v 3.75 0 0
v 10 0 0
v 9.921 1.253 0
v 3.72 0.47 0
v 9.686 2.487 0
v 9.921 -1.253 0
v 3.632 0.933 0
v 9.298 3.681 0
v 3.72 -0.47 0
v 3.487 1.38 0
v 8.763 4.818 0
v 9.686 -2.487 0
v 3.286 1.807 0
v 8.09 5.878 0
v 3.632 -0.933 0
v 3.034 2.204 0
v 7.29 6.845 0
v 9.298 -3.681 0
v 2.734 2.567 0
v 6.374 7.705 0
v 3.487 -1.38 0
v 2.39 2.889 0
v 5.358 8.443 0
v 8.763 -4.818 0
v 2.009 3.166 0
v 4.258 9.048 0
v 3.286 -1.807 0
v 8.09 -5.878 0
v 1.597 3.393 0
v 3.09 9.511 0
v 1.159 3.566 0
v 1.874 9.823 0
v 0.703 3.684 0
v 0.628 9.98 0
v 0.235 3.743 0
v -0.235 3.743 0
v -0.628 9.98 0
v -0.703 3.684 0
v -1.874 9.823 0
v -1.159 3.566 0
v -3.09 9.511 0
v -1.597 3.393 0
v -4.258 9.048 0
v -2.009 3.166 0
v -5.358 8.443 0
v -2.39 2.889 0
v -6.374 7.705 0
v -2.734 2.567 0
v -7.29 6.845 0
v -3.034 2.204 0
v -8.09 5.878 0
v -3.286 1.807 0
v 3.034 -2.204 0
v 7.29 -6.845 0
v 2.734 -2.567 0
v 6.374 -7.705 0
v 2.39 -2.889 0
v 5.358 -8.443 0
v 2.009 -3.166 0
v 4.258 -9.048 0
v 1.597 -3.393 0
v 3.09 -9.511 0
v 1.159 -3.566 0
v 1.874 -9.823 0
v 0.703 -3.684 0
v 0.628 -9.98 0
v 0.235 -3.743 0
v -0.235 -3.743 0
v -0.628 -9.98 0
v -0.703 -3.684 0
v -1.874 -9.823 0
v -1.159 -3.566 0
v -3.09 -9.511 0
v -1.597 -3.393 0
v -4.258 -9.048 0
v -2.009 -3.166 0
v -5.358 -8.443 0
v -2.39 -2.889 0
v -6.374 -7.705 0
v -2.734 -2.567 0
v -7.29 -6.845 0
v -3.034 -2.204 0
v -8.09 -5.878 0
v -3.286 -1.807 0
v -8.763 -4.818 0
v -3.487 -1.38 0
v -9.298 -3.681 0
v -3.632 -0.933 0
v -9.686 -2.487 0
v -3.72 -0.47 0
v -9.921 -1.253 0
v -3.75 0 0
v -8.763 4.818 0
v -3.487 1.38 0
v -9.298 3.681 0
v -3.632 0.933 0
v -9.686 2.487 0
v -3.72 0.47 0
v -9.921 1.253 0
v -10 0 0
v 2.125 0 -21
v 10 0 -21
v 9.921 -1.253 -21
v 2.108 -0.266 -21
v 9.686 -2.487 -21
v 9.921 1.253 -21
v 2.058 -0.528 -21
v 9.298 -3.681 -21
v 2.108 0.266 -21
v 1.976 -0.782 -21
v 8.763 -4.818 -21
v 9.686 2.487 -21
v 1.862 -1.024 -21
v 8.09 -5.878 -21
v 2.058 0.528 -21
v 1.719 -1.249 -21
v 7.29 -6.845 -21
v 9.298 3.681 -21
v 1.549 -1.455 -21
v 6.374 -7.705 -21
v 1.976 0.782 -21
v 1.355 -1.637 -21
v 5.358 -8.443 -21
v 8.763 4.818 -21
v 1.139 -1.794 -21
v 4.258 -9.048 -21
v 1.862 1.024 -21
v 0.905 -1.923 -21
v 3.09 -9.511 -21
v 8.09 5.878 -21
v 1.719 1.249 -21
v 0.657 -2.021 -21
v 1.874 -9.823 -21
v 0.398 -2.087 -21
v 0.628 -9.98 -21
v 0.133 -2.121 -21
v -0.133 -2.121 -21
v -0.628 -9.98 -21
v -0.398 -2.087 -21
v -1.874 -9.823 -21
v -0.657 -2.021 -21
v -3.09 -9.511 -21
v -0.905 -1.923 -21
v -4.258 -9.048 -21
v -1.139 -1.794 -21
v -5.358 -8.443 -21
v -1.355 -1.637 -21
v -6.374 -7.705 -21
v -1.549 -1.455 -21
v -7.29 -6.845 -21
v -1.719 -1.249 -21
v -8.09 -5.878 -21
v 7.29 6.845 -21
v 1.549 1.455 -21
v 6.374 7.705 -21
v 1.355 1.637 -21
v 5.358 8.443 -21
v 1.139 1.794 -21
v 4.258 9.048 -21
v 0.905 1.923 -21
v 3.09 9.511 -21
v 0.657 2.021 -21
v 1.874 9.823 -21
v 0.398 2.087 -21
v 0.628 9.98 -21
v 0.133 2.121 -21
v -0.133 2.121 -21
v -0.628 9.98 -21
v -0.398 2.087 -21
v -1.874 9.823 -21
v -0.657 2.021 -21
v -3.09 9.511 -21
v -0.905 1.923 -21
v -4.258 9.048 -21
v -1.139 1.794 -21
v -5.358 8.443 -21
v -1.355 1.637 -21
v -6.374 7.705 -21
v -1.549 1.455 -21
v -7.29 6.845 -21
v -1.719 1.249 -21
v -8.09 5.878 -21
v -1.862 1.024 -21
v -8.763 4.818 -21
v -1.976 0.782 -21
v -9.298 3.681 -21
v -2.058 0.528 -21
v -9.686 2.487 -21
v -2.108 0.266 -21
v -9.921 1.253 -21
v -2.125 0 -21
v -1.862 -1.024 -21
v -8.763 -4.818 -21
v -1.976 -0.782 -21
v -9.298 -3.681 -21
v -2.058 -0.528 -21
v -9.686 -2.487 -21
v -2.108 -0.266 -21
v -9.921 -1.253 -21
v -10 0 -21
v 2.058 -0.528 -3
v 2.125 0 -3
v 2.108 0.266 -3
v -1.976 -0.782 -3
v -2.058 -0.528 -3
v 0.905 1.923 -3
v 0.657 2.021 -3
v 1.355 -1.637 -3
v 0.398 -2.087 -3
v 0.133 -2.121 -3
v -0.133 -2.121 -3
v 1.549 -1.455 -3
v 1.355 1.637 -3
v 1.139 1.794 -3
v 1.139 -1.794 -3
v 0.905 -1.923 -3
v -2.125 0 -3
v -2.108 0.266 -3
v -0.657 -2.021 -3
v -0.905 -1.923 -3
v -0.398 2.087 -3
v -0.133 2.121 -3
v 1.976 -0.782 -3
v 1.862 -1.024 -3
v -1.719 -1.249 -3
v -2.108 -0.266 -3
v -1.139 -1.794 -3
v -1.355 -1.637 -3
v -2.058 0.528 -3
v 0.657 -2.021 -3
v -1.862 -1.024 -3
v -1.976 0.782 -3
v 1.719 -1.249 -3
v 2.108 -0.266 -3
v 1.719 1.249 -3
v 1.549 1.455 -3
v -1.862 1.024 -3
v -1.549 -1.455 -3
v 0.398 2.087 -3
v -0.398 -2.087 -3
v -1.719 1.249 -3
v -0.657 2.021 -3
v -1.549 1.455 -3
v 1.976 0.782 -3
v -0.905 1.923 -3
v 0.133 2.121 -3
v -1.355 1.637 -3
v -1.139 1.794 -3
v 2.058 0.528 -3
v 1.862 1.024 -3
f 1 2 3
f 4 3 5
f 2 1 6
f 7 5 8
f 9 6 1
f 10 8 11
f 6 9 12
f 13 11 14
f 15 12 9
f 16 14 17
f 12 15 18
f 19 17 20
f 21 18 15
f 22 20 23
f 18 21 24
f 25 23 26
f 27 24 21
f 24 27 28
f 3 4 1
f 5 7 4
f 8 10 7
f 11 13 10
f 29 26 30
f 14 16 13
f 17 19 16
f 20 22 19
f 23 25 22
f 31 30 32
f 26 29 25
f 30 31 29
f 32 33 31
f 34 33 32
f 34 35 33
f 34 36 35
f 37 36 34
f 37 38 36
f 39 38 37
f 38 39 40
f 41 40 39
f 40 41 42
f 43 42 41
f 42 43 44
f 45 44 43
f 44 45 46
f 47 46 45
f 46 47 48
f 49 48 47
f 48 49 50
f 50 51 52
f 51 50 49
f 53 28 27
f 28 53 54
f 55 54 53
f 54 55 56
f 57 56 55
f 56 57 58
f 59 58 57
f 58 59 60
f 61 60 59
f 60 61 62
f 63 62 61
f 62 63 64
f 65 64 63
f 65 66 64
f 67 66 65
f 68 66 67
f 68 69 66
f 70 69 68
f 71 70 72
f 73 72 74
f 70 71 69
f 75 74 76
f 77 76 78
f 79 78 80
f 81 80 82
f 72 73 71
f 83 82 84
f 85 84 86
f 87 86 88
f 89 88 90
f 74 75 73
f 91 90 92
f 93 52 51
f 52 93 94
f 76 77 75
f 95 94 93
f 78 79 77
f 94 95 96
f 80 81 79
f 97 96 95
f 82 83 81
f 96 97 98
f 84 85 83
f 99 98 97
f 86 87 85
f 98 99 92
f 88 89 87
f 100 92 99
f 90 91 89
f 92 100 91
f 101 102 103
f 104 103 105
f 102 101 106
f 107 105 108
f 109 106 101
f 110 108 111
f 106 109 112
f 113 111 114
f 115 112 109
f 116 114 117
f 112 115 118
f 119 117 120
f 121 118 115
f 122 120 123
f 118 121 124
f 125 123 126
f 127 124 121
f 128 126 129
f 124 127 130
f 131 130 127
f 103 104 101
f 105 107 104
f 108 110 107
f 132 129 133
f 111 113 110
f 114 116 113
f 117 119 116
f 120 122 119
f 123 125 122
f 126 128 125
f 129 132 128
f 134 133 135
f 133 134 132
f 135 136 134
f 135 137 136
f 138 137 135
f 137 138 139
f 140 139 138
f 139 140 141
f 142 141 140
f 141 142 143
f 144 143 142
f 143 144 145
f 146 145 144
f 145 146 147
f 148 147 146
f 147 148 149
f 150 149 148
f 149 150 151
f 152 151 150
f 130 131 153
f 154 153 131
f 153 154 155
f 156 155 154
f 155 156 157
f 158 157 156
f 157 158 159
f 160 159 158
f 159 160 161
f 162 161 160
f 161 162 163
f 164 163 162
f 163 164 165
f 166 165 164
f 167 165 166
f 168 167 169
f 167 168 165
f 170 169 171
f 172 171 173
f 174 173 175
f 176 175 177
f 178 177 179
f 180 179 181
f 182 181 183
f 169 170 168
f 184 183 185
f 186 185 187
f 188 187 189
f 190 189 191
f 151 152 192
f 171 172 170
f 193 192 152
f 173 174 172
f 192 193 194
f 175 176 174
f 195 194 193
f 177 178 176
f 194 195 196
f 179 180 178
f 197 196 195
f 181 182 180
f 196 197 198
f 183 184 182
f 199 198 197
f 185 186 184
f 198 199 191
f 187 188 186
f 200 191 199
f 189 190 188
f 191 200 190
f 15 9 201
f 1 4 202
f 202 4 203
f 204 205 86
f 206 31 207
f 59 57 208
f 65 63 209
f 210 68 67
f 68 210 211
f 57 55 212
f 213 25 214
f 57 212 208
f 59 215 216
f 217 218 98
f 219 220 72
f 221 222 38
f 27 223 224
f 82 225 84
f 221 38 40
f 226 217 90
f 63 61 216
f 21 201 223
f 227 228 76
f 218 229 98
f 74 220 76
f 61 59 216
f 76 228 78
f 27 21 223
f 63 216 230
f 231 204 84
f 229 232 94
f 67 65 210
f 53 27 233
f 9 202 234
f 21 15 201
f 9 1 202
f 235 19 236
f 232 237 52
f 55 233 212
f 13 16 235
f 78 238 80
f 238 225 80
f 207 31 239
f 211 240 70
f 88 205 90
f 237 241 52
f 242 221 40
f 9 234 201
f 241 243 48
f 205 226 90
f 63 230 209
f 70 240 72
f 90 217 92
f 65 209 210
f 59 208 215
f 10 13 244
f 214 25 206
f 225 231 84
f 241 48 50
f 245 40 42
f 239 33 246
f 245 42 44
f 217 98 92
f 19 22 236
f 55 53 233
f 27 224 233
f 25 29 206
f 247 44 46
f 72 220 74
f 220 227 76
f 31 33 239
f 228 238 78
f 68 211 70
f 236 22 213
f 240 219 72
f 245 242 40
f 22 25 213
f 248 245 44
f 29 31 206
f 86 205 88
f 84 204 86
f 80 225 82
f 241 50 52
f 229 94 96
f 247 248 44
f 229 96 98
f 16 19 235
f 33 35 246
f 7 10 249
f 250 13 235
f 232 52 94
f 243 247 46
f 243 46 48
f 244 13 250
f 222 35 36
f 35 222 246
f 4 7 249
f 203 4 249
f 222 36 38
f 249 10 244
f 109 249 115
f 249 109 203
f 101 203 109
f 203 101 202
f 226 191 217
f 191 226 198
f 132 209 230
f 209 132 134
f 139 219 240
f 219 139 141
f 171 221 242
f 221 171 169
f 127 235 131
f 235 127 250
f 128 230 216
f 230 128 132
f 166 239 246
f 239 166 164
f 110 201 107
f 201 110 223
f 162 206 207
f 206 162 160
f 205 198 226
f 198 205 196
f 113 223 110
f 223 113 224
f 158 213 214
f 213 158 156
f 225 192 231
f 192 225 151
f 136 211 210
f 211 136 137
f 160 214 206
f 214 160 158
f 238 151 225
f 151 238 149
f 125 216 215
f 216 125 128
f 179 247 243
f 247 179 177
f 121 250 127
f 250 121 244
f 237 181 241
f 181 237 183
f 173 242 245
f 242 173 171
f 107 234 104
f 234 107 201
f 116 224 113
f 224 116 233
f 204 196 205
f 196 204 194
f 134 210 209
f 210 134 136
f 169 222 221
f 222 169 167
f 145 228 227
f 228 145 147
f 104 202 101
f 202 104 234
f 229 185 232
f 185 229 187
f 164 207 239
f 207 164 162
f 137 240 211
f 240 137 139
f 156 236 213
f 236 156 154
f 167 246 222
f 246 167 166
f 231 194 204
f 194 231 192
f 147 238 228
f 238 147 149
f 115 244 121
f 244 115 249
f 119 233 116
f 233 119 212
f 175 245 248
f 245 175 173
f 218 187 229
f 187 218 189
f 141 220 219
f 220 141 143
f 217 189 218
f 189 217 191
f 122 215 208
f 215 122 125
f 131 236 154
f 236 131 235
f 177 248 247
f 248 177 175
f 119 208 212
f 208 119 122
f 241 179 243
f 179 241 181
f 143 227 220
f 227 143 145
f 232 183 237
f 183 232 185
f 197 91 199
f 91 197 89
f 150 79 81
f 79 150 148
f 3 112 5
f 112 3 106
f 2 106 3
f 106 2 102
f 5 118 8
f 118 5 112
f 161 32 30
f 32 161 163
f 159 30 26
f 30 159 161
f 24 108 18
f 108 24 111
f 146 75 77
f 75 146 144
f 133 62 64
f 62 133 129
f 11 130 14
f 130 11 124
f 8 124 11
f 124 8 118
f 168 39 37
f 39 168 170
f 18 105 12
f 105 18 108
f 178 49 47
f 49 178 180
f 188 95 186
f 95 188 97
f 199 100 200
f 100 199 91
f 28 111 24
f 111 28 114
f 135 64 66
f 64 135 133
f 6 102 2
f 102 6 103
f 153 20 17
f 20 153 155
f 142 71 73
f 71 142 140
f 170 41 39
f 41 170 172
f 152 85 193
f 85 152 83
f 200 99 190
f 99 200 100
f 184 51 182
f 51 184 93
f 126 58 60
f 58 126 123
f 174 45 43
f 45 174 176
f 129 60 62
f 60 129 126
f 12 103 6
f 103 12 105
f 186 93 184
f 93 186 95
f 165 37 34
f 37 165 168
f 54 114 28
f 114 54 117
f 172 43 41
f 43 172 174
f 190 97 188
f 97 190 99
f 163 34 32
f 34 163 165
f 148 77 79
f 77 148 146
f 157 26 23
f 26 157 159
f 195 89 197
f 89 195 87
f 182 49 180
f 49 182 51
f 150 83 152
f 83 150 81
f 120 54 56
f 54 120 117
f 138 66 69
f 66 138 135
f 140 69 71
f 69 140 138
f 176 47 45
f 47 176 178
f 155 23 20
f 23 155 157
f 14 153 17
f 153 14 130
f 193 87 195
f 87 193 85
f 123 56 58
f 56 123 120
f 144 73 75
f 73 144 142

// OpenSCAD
$fn = 50;


difference() {
	union() {
		translate(v = [0, 0, -21.0000000000]) {
			cylinder(h = 21, r = 10.0000000000);
		}
	}
	union() {
		translate(v = [0, 0, 0]) {
			rotate(a = [0, 0, 0]) {
				difference() {
					union() {
						#translate(v = [0, 0, -21.0000000000]) {
							cylinder(h = 21, r = 2.0000000000);
						}
						#translate(v = [0, 0, -3]) {
							cylinder(h = 3, r = 10.0000000000, r1 = 2.1250000000, r2 = 3.7500000000);
						}
						#translate(v = [0, 0, -21.0000000000]) {
							cylinder(h = 21, r = 2.1250000000);
						}
						#translate(v = [0, 0, -21.0000000000]) {
							cylinder(h = 21, r = 2.0000000000);
						}
					}
					union();
				}
			}
		}
	}
}
